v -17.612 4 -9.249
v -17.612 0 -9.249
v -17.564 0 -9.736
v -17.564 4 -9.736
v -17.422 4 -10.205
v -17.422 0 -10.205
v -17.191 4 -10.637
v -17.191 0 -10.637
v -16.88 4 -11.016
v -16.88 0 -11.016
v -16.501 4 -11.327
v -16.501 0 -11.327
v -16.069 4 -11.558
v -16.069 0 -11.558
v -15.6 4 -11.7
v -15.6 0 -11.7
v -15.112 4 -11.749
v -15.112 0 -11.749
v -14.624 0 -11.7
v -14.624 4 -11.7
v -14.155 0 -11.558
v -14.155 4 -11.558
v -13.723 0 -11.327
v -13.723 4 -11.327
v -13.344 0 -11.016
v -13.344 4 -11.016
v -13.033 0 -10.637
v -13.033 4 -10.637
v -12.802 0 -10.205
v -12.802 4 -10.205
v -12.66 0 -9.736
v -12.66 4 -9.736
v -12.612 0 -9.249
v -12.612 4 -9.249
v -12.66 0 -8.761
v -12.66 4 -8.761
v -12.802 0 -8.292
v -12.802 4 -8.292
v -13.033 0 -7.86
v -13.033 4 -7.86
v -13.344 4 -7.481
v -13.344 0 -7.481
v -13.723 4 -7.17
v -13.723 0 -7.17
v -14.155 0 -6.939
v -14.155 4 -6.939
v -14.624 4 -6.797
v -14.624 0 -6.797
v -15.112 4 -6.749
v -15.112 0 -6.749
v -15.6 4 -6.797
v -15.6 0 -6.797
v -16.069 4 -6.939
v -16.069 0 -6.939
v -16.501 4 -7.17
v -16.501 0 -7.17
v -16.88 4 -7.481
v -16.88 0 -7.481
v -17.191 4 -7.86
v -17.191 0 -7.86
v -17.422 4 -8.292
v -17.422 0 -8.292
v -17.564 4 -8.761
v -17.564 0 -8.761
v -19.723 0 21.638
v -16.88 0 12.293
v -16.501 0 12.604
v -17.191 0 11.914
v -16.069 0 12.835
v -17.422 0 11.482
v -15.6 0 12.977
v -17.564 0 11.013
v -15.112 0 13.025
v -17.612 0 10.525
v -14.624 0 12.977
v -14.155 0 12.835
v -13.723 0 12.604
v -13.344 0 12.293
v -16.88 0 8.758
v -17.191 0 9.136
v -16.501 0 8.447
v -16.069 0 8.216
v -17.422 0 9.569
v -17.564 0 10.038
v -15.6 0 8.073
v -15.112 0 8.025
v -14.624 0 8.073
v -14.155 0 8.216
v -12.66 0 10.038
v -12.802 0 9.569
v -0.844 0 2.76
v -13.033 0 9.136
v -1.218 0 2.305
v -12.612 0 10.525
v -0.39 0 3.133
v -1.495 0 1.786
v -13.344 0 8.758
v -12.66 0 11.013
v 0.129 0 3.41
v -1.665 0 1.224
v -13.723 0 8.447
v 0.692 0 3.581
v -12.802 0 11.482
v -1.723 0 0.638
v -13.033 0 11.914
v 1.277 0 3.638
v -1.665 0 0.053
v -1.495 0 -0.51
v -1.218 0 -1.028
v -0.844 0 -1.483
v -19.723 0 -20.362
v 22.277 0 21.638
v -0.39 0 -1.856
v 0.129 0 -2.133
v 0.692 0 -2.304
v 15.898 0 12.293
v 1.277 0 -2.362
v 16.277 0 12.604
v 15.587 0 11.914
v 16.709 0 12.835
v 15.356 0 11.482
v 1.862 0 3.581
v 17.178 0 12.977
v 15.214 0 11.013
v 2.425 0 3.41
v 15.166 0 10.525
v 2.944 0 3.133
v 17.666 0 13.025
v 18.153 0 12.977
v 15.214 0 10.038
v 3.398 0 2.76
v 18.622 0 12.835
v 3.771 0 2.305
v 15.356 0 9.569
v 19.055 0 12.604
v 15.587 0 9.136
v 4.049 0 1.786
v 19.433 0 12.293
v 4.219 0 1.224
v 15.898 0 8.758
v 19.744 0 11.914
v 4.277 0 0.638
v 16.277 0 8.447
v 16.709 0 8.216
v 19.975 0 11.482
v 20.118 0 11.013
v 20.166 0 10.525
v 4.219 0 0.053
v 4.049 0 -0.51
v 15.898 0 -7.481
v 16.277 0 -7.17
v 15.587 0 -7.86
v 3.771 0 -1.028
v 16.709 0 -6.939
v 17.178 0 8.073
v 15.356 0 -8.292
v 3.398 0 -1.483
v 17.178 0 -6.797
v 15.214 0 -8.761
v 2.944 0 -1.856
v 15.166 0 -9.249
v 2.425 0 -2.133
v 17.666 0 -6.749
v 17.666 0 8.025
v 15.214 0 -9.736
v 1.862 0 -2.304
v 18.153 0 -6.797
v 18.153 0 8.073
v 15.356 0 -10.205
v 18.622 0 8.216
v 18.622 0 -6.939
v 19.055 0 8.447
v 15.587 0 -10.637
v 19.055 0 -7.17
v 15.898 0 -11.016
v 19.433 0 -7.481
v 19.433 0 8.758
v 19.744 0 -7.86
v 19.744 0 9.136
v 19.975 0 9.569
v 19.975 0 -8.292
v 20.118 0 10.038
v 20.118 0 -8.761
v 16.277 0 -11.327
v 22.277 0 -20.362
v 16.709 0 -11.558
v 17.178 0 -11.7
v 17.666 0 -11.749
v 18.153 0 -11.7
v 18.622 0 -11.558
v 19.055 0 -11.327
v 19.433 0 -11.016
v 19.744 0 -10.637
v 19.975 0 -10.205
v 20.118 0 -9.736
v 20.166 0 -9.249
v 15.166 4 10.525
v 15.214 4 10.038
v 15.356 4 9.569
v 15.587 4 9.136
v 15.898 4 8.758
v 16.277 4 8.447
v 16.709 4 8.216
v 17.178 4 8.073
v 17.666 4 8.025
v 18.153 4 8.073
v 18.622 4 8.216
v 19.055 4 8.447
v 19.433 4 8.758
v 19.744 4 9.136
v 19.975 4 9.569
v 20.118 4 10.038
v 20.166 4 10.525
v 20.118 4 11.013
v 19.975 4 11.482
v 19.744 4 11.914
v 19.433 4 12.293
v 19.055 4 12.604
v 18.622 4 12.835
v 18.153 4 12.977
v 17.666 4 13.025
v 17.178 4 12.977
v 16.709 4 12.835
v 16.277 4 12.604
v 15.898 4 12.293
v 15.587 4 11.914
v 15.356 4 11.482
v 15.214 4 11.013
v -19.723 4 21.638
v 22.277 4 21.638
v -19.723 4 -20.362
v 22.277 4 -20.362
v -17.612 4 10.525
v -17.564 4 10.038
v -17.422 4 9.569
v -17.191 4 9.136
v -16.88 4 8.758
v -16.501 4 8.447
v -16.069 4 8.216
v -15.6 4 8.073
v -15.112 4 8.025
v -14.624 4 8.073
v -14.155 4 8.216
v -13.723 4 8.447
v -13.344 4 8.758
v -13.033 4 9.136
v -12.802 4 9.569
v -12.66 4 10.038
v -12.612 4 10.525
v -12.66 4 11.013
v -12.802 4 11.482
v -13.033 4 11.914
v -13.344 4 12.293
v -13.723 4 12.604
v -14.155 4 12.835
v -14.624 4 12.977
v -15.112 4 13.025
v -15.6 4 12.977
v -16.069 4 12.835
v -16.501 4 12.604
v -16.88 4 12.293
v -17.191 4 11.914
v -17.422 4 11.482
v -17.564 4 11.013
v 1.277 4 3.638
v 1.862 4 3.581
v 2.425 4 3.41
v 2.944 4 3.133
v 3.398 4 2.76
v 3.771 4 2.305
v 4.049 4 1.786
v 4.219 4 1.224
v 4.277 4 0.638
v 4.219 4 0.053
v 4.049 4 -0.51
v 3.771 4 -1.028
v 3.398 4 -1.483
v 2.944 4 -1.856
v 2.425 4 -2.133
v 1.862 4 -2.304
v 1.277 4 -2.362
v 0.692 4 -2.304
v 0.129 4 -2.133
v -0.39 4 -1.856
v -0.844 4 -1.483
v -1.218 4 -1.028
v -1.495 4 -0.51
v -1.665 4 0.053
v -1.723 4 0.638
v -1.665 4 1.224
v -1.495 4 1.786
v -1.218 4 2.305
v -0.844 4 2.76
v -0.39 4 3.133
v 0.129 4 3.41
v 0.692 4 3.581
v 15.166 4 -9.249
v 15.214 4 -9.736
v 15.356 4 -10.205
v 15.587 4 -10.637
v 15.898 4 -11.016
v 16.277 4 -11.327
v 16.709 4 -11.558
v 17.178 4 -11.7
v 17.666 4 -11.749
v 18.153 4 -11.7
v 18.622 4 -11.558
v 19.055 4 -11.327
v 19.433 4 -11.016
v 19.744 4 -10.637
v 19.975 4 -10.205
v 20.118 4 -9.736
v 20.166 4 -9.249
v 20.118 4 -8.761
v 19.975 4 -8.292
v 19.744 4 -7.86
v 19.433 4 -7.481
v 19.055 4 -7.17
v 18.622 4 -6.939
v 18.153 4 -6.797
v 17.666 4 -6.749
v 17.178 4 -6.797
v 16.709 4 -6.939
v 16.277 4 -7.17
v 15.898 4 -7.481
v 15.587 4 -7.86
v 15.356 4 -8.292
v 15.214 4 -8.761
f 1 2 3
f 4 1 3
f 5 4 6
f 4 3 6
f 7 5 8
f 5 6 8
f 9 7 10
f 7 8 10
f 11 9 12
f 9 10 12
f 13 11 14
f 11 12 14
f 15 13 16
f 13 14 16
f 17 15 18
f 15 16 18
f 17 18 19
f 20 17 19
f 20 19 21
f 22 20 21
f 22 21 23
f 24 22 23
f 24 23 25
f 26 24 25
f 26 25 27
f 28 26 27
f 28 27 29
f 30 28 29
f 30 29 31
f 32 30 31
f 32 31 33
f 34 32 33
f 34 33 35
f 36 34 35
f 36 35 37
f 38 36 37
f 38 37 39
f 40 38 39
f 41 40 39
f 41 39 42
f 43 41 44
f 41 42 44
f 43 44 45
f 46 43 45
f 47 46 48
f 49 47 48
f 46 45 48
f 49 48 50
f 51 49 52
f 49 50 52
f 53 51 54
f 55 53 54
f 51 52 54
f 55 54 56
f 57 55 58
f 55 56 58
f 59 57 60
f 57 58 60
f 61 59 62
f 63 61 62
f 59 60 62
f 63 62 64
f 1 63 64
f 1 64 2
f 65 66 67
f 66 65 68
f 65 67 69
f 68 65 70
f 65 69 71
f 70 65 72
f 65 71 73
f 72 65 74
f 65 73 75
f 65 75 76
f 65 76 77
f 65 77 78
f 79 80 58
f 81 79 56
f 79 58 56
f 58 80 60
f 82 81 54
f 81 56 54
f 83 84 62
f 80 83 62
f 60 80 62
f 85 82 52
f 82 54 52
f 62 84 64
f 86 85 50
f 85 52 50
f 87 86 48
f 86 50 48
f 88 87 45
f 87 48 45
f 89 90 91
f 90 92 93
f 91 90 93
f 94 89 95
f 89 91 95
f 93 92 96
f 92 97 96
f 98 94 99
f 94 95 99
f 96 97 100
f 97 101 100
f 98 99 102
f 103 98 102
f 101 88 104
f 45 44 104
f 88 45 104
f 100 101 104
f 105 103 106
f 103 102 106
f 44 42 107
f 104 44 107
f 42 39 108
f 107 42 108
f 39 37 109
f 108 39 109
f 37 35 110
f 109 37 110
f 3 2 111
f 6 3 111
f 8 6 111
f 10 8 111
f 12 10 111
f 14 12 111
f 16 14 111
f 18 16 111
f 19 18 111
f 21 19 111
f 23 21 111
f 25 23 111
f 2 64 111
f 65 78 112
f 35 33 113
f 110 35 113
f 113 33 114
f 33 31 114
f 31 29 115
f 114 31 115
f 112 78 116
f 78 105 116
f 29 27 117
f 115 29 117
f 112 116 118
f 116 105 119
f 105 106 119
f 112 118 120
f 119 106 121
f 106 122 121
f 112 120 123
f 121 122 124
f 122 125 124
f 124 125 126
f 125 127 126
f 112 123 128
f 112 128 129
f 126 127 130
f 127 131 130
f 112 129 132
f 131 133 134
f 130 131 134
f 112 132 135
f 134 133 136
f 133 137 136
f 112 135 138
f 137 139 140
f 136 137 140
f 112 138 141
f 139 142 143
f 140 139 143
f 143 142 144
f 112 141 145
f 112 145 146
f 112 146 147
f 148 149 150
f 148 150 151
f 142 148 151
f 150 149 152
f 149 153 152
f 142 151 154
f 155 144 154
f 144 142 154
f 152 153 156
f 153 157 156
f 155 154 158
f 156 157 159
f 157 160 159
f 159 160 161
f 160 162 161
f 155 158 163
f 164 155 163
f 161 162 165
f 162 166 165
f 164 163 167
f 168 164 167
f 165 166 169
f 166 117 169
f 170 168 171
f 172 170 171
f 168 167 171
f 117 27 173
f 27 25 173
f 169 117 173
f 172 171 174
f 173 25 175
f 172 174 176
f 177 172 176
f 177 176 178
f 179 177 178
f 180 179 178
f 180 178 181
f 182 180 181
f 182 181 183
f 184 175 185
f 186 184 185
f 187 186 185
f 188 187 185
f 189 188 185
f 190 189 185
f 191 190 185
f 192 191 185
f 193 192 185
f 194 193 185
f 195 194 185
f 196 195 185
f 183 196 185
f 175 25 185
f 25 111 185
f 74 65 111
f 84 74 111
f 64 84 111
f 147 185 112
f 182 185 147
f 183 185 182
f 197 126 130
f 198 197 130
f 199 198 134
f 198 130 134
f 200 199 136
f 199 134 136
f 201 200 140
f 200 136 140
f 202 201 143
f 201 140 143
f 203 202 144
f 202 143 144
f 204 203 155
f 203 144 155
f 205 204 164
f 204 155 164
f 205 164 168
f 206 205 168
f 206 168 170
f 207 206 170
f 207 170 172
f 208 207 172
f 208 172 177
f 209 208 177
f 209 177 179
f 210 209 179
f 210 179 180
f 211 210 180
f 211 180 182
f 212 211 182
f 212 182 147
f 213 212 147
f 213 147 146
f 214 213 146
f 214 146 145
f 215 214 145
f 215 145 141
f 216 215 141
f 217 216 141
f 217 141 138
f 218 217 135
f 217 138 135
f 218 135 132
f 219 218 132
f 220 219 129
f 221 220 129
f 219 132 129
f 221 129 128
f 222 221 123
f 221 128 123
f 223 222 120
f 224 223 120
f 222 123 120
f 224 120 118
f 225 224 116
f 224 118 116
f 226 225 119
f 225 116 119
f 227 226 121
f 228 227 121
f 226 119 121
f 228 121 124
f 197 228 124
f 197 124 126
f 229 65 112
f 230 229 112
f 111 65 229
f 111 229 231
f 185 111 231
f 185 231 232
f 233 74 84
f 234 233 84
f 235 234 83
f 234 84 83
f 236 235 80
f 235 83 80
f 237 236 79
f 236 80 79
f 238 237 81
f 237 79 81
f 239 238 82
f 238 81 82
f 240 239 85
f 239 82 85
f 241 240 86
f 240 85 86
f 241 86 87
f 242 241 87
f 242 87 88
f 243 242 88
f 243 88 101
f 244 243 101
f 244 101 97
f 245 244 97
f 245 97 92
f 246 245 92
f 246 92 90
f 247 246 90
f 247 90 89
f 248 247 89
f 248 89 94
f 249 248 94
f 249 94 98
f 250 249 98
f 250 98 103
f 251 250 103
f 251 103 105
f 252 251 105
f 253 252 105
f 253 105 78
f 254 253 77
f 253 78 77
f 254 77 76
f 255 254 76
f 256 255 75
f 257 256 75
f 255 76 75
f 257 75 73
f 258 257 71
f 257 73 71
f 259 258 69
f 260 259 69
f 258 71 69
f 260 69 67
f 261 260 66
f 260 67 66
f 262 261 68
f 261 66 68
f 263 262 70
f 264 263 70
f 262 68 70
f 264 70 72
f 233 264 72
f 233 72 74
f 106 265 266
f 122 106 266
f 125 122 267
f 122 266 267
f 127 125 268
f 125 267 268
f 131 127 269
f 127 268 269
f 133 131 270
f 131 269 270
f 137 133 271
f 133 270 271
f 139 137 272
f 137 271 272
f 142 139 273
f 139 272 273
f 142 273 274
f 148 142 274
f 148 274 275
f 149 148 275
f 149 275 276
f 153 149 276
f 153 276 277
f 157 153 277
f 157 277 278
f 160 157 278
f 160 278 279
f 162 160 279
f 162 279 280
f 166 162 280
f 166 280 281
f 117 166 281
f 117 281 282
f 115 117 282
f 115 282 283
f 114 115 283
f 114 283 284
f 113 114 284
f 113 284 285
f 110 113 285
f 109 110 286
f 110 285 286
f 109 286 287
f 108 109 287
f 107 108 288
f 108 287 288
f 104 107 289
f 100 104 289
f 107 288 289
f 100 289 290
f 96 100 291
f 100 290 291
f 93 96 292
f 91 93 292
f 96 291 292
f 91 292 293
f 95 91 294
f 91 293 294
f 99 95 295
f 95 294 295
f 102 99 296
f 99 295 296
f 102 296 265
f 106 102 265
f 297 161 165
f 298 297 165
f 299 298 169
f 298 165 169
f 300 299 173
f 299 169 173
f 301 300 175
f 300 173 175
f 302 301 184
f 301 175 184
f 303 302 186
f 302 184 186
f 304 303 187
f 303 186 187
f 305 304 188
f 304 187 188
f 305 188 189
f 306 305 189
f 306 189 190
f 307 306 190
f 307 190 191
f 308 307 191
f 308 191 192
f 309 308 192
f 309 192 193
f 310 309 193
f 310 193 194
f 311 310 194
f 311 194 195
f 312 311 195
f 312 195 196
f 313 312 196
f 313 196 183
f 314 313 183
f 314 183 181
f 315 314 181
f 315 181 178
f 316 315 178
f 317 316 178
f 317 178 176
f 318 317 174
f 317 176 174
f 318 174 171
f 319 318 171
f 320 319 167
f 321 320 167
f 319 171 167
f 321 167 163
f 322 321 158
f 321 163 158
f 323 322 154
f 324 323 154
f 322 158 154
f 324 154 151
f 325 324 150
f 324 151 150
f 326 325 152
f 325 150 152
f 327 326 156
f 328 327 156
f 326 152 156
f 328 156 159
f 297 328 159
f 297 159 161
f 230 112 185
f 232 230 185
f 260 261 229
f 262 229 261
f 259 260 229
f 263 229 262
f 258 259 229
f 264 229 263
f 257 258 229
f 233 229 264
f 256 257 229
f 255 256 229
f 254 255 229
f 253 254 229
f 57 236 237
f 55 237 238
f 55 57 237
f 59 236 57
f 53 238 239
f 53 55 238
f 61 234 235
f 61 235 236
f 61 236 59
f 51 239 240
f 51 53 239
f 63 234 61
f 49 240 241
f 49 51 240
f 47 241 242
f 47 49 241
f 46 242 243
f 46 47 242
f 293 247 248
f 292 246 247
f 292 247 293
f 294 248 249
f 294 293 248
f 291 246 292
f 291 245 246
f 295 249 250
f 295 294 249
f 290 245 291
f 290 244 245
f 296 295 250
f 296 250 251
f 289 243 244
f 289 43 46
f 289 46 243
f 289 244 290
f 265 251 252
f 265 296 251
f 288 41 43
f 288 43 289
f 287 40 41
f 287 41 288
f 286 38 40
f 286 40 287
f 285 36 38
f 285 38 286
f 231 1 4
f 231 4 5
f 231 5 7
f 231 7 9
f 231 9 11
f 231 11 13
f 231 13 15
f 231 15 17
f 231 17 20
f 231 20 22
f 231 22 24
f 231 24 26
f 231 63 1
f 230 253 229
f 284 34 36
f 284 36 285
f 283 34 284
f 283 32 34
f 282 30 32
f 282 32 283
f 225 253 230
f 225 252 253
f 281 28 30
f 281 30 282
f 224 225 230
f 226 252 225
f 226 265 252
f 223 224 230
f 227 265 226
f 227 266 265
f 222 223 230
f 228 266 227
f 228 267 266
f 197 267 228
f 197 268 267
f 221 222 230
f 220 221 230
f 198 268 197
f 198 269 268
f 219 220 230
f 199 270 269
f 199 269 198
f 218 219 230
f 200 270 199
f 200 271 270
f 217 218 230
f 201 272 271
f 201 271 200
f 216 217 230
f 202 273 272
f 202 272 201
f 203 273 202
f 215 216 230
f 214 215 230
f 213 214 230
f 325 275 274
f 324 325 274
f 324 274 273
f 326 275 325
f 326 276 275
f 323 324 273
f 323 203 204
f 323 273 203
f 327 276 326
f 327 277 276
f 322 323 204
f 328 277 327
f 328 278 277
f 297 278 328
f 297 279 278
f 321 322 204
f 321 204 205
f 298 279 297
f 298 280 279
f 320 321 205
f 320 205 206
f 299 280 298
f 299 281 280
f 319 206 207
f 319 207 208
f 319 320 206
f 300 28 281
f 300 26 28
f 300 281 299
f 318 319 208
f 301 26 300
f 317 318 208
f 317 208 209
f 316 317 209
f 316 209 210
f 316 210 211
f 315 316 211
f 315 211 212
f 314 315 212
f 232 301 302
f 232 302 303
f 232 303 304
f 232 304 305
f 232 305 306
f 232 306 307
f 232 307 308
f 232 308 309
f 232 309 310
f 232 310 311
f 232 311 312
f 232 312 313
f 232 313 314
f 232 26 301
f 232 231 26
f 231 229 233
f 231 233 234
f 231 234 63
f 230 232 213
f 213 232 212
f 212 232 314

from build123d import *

# Parameters (mm, degrees)
SKETCH1_W                 = 42
SKETCH1_H                 = 42
BOSS_EXTRUDE1_DEPTH       = 4
SKETCH2_R                 = 3
CUT_EXTRUDE1_DEPTH        = 16
F_5_0MM_DOWEL_HOLE1_D     = 5
F_5_0MM_DOWEL_HOLE1_DEPTH = 25
F_5_0MM_DOWEL_HOLE1_TIP   = 1.502151548


with BuildPart() as part:
    # Sketch1 → Boss-Extrude1 (new body)
    with BuildSketch(Plane(origin=(0, 0, 0), x_dir=(1, 0, 0), z_dir=(0, 1, 0))):
        with Locations((1.276868931, -0.638434466)):
            Rectangle(SKETCH1_W, SKETCH1_H)
    extrude(amount=BOSS_EXTRUDE1_DEPTH)

    # Sketch2 → Cut-Extrude1 (cut)
    with BuildSketch(Plane(origin=(0, 4, 0), x_dir=(1, 0, 0), z_dir=(0, 1, 0))):
        with Locations(Location((1.276868931, -0.638434466, 0), (0, 0, 270))):
            Circle(SKETCH2_R)
    extrude(amount=-CUT_EXTRUDE1_DEPTH, mode=Mode.SUBTRACT)

    # Ø5.0mm Dowel Hole1
    with Locations(Plane(origin=(0, 4, 0), x_dir=(1, 0, 0), z_dir=(0, 1, 0))):
        with Locations((-15.111953931, -10.525403014), (-15.111953931, 9.248534083), (17.665691793, 9.248534083), (17.665691793, -10.525403014)):
            Hole(F_5_0MM_DOWEL_HOLE1_D / 2, depth=F_5_0MM_DOWEL_HOLE1_DEPTH)
            with Locations((0, 0, -(F_5_0MM_DOWEL_HOLE1_DEPTH + F_5_0MM_DOWEL_HOLE1_TIP / 2))):  # 118° drill point
                Cone(0, F_5_0MM_DOWEL_HOLE1_D / 2, F_5_0MM_DOWEL_HOLE1_TIP, mode=Mode.SUBTRACT)


solid = part.part
